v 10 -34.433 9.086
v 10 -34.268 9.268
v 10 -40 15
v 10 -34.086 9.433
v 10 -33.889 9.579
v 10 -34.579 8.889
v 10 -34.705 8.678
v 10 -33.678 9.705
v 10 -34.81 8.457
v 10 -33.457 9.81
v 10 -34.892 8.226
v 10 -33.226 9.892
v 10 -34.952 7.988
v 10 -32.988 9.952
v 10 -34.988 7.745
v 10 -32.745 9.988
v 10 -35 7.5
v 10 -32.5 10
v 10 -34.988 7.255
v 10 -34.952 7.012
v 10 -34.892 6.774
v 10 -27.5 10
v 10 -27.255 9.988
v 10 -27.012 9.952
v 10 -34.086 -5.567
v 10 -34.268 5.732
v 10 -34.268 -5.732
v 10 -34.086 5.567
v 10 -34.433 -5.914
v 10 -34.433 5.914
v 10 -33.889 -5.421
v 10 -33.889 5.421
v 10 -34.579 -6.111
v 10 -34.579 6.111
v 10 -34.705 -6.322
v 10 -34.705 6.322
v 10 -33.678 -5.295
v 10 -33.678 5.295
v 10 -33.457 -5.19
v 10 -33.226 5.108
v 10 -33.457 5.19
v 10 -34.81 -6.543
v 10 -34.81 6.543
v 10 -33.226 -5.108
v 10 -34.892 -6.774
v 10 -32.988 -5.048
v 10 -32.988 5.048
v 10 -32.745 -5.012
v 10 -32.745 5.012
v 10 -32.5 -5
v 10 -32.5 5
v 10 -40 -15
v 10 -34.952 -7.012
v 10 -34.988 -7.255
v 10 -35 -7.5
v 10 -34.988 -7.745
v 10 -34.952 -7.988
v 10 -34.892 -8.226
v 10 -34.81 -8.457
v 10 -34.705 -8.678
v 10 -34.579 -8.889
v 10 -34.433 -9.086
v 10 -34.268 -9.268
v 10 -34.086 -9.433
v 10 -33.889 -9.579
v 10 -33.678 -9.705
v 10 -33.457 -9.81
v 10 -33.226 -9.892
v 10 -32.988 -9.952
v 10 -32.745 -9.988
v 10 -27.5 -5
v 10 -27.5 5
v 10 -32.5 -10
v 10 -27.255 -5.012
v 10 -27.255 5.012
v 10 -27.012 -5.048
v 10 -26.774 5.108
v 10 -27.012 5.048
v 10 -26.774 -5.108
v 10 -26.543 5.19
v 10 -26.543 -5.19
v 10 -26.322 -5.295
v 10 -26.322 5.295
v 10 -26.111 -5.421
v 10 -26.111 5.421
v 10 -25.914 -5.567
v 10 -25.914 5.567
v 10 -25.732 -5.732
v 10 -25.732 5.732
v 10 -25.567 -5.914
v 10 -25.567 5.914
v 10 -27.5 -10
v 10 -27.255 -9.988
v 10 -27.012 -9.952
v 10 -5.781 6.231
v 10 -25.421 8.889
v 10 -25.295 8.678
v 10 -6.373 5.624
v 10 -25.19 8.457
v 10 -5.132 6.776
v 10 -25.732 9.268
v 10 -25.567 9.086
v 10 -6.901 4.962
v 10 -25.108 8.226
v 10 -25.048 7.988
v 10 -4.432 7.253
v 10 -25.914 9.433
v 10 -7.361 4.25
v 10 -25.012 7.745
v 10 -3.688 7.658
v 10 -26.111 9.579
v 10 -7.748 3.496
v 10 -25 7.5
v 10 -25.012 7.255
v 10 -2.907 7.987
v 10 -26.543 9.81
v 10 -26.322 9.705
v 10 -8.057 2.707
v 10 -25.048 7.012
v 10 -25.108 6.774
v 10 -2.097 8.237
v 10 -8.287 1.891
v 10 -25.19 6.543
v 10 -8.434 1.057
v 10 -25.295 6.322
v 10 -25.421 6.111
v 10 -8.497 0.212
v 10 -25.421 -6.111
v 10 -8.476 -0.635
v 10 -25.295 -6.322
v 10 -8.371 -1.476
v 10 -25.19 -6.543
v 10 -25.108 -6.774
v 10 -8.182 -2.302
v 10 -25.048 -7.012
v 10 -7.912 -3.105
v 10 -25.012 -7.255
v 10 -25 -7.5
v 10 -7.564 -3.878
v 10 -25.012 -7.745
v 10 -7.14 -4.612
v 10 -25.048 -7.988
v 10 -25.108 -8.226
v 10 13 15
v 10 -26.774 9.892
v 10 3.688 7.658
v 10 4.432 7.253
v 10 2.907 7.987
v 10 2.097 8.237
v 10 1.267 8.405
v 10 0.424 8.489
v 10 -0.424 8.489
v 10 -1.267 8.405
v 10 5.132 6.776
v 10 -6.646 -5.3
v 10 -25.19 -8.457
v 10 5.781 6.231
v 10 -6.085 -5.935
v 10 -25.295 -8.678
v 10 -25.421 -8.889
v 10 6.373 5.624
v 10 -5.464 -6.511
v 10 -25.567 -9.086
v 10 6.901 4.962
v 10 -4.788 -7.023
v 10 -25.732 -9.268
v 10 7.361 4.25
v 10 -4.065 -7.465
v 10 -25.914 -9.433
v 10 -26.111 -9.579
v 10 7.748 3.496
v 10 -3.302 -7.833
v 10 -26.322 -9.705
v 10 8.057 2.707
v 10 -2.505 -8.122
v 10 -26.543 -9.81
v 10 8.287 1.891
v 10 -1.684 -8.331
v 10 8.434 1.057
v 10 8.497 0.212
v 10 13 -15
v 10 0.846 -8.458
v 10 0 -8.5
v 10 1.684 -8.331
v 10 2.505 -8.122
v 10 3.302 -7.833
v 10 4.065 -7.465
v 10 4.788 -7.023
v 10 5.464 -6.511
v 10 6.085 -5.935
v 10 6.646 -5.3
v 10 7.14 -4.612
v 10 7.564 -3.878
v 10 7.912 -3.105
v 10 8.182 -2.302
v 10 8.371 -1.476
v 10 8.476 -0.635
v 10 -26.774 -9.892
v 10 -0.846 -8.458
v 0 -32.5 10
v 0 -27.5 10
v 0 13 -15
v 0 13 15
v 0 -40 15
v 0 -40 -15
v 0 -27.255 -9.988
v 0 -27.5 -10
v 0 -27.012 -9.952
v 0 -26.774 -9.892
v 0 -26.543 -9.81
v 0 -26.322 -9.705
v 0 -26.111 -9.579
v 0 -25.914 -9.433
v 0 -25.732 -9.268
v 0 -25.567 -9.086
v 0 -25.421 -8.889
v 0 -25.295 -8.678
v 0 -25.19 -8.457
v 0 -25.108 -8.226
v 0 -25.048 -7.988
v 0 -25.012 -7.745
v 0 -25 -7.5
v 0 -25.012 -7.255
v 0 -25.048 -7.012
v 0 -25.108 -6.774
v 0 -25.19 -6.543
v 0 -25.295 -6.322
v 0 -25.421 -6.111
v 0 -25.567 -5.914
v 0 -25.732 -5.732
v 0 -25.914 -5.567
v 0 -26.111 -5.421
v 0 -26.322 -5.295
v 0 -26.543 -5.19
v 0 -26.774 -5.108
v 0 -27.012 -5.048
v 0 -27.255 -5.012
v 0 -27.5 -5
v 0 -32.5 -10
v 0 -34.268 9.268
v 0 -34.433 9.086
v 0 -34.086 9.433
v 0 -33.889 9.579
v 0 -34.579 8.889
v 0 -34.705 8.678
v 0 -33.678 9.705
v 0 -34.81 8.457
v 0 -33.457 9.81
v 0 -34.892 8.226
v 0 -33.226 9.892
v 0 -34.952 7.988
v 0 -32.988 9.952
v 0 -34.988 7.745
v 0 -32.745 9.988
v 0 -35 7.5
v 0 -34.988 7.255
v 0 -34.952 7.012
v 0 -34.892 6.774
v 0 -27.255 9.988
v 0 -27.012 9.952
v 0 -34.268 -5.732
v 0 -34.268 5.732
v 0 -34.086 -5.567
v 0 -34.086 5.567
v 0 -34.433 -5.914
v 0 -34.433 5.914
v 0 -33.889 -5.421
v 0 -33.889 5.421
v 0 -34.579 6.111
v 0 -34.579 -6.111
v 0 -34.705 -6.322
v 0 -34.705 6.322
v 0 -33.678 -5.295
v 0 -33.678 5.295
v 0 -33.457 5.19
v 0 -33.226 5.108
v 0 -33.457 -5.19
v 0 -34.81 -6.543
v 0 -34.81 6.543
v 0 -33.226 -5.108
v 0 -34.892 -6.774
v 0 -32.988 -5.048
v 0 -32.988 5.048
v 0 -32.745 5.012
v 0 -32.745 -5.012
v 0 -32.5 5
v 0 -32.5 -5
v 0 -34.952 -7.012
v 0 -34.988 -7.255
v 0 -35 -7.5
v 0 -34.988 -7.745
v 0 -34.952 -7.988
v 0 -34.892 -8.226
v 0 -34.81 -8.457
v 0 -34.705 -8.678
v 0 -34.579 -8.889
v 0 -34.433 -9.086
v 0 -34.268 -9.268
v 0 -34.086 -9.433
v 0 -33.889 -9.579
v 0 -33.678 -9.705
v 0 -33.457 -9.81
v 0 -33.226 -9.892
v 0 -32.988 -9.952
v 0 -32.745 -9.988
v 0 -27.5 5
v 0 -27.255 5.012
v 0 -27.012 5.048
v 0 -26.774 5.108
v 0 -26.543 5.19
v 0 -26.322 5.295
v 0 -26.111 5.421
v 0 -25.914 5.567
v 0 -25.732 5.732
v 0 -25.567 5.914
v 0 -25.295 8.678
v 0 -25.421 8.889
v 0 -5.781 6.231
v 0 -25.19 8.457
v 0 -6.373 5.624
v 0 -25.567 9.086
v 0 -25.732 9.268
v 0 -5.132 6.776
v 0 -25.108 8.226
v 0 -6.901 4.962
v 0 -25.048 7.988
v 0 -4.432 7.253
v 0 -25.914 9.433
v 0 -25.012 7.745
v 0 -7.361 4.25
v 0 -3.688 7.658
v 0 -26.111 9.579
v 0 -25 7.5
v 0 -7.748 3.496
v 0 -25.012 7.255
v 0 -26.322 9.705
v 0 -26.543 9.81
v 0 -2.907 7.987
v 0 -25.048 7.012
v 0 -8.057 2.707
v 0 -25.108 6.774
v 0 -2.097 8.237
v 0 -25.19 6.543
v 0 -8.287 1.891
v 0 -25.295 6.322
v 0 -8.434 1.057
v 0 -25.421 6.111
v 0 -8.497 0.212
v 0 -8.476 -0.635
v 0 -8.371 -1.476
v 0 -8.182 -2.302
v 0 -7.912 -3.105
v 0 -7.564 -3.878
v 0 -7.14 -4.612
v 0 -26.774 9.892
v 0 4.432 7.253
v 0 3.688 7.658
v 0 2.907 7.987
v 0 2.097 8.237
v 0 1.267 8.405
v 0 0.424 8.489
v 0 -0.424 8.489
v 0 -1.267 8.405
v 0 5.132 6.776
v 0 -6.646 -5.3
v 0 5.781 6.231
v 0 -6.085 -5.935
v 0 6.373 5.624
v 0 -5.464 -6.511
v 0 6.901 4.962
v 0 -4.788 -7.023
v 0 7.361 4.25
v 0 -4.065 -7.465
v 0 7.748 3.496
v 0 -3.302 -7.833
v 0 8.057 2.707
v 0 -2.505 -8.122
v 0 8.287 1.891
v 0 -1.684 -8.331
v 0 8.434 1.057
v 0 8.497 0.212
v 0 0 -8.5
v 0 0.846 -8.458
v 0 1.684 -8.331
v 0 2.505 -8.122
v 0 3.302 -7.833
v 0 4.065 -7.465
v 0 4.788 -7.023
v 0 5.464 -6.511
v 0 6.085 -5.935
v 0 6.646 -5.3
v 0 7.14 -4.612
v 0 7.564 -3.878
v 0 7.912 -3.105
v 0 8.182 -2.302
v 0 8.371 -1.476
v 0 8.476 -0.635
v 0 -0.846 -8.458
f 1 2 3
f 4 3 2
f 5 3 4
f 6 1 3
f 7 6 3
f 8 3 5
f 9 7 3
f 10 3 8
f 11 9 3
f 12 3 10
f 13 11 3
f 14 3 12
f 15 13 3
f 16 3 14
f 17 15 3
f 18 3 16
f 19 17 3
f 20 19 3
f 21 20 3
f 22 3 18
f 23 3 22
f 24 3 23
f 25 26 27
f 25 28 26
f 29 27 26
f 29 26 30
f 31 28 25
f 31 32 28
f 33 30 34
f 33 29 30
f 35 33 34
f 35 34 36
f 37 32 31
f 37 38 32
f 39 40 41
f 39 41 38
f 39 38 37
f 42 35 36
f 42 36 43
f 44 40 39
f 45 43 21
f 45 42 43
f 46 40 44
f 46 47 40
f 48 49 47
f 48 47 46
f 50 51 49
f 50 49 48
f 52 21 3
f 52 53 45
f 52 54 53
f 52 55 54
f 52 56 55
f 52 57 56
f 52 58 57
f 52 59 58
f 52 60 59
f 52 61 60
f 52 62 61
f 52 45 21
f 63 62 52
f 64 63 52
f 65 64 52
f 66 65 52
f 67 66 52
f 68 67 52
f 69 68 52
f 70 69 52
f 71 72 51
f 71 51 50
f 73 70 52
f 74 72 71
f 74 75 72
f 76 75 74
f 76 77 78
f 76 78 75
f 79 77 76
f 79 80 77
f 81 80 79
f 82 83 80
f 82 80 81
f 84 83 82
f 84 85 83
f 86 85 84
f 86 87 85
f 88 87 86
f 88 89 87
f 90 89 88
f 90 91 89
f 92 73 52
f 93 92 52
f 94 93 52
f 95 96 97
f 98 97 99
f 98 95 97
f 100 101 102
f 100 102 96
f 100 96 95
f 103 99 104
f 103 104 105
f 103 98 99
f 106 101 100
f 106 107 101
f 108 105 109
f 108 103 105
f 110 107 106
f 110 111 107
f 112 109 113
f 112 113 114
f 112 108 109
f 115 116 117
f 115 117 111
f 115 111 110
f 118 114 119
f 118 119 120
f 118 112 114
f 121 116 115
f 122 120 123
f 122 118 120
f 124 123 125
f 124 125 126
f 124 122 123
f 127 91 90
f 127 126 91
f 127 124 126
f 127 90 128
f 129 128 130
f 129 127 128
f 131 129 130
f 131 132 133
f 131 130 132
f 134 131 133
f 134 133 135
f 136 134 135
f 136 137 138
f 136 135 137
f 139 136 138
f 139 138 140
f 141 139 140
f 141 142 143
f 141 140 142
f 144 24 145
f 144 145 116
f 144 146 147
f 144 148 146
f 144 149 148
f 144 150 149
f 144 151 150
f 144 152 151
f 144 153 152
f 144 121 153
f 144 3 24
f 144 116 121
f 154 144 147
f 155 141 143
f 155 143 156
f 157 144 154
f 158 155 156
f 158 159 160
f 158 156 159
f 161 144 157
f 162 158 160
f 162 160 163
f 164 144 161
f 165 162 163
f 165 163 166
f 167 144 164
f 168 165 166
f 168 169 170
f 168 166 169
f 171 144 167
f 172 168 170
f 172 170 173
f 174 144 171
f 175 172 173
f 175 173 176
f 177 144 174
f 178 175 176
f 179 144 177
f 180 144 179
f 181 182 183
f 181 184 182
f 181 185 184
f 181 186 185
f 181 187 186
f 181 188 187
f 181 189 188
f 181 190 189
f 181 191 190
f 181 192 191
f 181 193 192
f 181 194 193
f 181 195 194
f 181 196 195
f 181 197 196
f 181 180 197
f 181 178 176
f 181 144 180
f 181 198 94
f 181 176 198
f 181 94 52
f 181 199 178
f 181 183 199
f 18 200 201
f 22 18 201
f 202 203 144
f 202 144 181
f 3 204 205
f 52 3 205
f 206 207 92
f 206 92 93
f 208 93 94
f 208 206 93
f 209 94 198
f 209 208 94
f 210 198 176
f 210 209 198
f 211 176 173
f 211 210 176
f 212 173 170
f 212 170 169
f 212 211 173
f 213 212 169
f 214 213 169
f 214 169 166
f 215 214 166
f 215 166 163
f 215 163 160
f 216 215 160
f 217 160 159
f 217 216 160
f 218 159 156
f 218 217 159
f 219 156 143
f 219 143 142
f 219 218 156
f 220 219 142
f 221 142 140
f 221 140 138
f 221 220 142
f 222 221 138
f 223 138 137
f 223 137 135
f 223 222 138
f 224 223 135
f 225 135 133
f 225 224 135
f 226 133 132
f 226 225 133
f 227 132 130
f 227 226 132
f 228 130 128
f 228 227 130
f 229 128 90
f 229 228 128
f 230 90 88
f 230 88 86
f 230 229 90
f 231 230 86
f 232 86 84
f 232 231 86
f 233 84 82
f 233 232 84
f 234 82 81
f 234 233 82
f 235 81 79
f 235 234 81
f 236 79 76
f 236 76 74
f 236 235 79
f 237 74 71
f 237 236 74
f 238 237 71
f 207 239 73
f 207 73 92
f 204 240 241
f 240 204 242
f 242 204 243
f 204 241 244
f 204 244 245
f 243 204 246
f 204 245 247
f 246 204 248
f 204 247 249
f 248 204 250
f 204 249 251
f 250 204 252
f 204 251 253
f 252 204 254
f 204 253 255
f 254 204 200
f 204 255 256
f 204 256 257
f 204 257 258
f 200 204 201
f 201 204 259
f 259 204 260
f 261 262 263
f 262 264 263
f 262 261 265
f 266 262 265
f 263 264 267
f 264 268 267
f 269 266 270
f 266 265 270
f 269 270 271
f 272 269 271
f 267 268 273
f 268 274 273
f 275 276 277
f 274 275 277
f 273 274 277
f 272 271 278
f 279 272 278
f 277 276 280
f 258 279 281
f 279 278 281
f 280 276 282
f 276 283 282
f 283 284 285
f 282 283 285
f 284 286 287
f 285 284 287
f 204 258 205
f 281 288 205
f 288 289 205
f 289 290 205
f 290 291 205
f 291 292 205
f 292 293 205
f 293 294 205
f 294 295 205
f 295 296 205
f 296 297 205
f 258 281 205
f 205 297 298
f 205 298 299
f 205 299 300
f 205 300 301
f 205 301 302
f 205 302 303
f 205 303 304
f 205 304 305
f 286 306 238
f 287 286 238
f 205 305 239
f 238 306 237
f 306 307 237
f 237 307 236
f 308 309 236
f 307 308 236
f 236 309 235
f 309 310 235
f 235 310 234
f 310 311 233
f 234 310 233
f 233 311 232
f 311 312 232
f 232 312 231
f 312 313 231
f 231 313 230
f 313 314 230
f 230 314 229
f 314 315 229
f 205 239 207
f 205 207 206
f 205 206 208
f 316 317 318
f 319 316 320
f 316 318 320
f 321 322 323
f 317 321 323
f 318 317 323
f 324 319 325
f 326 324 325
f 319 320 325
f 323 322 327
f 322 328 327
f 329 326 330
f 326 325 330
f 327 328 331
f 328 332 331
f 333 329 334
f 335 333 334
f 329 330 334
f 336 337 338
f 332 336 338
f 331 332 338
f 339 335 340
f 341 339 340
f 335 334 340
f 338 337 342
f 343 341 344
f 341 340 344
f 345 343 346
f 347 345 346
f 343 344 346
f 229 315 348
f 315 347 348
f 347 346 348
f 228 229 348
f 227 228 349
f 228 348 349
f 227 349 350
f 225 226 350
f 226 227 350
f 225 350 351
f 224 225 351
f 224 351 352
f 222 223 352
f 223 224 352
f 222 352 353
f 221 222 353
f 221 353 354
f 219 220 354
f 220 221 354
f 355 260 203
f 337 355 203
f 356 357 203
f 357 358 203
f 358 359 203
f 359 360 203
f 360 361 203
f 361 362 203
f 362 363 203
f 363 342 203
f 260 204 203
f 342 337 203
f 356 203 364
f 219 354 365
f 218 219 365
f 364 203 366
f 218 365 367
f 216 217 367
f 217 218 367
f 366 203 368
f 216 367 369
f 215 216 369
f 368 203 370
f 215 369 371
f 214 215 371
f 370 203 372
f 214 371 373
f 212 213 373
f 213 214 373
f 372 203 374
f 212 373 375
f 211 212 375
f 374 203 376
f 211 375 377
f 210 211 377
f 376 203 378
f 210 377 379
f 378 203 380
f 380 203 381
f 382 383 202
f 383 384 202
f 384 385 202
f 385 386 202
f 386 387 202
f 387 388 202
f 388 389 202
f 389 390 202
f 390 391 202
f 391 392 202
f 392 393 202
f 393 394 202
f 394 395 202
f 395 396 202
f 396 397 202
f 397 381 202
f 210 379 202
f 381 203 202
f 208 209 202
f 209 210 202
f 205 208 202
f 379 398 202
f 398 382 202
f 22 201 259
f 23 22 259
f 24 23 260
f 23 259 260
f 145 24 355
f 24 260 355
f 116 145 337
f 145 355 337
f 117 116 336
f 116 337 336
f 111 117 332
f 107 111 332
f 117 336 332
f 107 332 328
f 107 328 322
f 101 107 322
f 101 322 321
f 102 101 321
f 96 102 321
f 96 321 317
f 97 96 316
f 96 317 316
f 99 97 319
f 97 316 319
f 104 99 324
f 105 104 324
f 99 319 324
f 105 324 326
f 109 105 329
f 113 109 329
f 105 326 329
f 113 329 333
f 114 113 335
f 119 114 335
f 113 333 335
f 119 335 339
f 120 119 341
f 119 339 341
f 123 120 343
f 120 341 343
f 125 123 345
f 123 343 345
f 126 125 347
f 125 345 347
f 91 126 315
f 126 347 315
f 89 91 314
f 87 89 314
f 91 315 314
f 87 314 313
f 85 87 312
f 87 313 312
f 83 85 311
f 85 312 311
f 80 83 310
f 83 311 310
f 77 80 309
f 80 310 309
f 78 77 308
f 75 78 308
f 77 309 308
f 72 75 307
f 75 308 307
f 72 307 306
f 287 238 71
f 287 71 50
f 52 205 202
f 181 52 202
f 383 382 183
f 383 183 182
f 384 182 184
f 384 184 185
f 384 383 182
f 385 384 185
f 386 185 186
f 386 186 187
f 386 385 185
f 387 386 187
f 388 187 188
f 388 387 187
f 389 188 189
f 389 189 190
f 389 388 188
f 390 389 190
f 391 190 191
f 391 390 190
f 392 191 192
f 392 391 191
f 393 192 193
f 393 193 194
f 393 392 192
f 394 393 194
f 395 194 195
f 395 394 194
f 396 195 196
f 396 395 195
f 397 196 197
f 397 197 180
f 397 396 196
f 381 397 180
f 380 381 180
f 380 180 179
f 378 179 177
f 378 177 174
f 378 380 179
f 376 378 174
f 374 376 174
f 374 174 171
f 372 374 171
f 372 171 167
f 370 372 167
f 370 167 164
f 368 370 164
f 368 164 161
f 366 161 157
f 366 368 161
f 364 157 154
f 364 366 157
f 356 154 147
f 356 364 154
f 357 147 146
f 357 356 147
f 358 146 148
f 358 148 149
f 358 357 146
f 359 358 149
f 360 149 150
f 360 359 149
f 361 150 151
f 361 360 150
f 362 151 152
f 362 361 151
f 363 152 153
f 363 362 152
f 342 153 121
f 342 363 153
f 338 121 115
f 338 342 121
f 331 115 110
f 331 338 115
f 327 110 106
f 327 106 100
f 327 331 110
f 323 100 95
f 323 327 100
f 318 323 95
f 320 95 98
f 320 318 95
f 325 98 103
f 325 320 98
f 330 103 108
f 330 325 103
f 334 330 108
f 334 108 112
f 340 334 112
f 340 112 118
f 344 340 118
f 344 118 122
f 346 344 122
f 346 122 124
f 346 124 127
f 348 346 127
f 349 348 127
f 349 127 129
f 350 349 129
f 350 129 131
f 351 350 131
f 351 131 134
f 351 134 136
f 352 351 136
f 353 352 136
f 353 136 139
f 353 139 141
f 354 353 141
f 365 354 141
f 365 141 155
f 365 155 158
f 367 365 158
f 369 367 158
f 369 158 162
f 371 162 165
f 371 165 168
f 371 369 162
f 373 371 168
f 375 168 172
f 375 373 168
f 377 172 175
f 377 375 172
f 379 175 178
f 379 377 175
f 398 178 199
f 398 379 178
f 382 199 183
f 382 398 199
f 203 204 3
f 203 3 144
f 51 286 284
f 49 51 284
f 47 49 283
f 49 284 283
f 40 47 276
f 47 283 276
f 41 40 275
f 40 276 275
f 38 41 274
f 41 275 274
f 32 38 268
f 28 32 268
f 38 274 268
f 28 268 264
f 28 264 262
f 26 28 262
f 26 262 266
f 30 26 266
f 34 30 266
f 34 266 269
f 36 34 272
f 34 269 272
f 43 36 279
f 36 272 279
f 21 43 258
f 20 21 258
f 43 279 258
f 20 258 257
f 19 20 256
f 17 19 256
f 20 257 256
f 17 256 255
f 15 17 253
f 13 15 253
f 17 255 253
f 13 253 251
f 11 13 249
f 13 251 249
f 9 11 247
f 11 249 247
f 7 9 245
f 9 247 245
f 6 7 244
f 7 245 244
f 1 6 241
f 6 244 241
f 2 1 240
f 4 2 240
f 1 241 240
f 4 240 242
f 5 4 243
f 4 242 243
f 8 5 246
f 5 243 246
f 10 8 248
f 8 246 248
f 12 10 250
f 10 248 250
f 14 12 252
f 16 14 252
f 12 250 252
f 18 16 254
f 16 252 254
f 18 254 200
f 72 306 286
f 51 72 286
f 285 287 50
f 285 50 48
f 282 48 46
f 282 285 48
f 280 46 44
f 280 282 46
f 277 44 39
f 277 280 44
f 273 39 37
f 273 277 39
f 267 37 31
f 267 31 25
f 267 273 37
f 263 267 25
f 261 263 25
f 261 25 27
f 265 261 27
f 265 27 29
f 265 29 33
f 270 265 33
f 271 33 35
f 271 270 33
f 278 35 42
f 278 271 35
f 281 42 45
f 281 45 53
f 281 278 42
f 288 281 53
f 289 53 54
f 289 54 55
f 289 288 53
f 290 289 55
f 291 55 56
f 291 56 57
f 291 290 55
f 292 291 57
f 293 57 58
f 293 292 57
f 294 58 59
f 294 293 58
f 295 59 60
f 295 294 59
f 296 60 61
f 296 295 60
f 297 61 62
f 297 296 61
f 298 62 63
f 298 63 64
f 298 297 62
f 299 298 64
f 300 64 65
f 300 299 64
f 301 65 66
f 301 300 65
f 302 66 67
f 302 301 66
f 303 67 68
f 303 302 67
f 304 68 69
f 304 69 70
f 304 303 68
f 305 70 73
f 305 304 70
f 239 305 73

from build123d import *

# Parameters (mm, degrees)
SKETCH1_W           = 30
SKETCH1_H           = 53
SKETCH1_R           = 8.5
BOSS_EXTRUDE1_DEPTH = 10


with BuildPart() as part:
    # Sketch1 → Boss-Extrude1 (new body)
    with BuildSketch(Plane(origin=(0, 0, 0), x_dir=(0, 0, -1), z_dir=(1, 0, 0))):
        with Locations((0, -13.5)):
            Rectangle(SKETCH1_W, SKETCH1_H)
        Circle(SKETCH1_R, mode=Mode.SUBTRACT)
        with BuildLine():
            Line((-5, -27.5), (-5, -32.5))
            ThreePointArc((-5, -32.5), (-7.5, -35), (-10, -32.5))
            Line((-10, -32.5), (-10, -27.5))
            ThreePointArc((-10, -27.5), (-7.5, -25), (-5, -27.5))
        make_face(mode=Mode.SUBTRACT)
        with BuildLine():
            Line((5, -27.5), (5, -32.5))
            ThreePointArc((5, -32.5), (7.5, -35), (10, -32.5))
            Line((10, -32.5), (10, -27.5))
            ThreePointArc((10, -27.5), (7.5, -25), (5, -27.5))
        make_face(mode=Mode.SUBTRACT)
    extrude(amount=BOSS_EXTRUDE1_DEPTH)


solid = part.part
